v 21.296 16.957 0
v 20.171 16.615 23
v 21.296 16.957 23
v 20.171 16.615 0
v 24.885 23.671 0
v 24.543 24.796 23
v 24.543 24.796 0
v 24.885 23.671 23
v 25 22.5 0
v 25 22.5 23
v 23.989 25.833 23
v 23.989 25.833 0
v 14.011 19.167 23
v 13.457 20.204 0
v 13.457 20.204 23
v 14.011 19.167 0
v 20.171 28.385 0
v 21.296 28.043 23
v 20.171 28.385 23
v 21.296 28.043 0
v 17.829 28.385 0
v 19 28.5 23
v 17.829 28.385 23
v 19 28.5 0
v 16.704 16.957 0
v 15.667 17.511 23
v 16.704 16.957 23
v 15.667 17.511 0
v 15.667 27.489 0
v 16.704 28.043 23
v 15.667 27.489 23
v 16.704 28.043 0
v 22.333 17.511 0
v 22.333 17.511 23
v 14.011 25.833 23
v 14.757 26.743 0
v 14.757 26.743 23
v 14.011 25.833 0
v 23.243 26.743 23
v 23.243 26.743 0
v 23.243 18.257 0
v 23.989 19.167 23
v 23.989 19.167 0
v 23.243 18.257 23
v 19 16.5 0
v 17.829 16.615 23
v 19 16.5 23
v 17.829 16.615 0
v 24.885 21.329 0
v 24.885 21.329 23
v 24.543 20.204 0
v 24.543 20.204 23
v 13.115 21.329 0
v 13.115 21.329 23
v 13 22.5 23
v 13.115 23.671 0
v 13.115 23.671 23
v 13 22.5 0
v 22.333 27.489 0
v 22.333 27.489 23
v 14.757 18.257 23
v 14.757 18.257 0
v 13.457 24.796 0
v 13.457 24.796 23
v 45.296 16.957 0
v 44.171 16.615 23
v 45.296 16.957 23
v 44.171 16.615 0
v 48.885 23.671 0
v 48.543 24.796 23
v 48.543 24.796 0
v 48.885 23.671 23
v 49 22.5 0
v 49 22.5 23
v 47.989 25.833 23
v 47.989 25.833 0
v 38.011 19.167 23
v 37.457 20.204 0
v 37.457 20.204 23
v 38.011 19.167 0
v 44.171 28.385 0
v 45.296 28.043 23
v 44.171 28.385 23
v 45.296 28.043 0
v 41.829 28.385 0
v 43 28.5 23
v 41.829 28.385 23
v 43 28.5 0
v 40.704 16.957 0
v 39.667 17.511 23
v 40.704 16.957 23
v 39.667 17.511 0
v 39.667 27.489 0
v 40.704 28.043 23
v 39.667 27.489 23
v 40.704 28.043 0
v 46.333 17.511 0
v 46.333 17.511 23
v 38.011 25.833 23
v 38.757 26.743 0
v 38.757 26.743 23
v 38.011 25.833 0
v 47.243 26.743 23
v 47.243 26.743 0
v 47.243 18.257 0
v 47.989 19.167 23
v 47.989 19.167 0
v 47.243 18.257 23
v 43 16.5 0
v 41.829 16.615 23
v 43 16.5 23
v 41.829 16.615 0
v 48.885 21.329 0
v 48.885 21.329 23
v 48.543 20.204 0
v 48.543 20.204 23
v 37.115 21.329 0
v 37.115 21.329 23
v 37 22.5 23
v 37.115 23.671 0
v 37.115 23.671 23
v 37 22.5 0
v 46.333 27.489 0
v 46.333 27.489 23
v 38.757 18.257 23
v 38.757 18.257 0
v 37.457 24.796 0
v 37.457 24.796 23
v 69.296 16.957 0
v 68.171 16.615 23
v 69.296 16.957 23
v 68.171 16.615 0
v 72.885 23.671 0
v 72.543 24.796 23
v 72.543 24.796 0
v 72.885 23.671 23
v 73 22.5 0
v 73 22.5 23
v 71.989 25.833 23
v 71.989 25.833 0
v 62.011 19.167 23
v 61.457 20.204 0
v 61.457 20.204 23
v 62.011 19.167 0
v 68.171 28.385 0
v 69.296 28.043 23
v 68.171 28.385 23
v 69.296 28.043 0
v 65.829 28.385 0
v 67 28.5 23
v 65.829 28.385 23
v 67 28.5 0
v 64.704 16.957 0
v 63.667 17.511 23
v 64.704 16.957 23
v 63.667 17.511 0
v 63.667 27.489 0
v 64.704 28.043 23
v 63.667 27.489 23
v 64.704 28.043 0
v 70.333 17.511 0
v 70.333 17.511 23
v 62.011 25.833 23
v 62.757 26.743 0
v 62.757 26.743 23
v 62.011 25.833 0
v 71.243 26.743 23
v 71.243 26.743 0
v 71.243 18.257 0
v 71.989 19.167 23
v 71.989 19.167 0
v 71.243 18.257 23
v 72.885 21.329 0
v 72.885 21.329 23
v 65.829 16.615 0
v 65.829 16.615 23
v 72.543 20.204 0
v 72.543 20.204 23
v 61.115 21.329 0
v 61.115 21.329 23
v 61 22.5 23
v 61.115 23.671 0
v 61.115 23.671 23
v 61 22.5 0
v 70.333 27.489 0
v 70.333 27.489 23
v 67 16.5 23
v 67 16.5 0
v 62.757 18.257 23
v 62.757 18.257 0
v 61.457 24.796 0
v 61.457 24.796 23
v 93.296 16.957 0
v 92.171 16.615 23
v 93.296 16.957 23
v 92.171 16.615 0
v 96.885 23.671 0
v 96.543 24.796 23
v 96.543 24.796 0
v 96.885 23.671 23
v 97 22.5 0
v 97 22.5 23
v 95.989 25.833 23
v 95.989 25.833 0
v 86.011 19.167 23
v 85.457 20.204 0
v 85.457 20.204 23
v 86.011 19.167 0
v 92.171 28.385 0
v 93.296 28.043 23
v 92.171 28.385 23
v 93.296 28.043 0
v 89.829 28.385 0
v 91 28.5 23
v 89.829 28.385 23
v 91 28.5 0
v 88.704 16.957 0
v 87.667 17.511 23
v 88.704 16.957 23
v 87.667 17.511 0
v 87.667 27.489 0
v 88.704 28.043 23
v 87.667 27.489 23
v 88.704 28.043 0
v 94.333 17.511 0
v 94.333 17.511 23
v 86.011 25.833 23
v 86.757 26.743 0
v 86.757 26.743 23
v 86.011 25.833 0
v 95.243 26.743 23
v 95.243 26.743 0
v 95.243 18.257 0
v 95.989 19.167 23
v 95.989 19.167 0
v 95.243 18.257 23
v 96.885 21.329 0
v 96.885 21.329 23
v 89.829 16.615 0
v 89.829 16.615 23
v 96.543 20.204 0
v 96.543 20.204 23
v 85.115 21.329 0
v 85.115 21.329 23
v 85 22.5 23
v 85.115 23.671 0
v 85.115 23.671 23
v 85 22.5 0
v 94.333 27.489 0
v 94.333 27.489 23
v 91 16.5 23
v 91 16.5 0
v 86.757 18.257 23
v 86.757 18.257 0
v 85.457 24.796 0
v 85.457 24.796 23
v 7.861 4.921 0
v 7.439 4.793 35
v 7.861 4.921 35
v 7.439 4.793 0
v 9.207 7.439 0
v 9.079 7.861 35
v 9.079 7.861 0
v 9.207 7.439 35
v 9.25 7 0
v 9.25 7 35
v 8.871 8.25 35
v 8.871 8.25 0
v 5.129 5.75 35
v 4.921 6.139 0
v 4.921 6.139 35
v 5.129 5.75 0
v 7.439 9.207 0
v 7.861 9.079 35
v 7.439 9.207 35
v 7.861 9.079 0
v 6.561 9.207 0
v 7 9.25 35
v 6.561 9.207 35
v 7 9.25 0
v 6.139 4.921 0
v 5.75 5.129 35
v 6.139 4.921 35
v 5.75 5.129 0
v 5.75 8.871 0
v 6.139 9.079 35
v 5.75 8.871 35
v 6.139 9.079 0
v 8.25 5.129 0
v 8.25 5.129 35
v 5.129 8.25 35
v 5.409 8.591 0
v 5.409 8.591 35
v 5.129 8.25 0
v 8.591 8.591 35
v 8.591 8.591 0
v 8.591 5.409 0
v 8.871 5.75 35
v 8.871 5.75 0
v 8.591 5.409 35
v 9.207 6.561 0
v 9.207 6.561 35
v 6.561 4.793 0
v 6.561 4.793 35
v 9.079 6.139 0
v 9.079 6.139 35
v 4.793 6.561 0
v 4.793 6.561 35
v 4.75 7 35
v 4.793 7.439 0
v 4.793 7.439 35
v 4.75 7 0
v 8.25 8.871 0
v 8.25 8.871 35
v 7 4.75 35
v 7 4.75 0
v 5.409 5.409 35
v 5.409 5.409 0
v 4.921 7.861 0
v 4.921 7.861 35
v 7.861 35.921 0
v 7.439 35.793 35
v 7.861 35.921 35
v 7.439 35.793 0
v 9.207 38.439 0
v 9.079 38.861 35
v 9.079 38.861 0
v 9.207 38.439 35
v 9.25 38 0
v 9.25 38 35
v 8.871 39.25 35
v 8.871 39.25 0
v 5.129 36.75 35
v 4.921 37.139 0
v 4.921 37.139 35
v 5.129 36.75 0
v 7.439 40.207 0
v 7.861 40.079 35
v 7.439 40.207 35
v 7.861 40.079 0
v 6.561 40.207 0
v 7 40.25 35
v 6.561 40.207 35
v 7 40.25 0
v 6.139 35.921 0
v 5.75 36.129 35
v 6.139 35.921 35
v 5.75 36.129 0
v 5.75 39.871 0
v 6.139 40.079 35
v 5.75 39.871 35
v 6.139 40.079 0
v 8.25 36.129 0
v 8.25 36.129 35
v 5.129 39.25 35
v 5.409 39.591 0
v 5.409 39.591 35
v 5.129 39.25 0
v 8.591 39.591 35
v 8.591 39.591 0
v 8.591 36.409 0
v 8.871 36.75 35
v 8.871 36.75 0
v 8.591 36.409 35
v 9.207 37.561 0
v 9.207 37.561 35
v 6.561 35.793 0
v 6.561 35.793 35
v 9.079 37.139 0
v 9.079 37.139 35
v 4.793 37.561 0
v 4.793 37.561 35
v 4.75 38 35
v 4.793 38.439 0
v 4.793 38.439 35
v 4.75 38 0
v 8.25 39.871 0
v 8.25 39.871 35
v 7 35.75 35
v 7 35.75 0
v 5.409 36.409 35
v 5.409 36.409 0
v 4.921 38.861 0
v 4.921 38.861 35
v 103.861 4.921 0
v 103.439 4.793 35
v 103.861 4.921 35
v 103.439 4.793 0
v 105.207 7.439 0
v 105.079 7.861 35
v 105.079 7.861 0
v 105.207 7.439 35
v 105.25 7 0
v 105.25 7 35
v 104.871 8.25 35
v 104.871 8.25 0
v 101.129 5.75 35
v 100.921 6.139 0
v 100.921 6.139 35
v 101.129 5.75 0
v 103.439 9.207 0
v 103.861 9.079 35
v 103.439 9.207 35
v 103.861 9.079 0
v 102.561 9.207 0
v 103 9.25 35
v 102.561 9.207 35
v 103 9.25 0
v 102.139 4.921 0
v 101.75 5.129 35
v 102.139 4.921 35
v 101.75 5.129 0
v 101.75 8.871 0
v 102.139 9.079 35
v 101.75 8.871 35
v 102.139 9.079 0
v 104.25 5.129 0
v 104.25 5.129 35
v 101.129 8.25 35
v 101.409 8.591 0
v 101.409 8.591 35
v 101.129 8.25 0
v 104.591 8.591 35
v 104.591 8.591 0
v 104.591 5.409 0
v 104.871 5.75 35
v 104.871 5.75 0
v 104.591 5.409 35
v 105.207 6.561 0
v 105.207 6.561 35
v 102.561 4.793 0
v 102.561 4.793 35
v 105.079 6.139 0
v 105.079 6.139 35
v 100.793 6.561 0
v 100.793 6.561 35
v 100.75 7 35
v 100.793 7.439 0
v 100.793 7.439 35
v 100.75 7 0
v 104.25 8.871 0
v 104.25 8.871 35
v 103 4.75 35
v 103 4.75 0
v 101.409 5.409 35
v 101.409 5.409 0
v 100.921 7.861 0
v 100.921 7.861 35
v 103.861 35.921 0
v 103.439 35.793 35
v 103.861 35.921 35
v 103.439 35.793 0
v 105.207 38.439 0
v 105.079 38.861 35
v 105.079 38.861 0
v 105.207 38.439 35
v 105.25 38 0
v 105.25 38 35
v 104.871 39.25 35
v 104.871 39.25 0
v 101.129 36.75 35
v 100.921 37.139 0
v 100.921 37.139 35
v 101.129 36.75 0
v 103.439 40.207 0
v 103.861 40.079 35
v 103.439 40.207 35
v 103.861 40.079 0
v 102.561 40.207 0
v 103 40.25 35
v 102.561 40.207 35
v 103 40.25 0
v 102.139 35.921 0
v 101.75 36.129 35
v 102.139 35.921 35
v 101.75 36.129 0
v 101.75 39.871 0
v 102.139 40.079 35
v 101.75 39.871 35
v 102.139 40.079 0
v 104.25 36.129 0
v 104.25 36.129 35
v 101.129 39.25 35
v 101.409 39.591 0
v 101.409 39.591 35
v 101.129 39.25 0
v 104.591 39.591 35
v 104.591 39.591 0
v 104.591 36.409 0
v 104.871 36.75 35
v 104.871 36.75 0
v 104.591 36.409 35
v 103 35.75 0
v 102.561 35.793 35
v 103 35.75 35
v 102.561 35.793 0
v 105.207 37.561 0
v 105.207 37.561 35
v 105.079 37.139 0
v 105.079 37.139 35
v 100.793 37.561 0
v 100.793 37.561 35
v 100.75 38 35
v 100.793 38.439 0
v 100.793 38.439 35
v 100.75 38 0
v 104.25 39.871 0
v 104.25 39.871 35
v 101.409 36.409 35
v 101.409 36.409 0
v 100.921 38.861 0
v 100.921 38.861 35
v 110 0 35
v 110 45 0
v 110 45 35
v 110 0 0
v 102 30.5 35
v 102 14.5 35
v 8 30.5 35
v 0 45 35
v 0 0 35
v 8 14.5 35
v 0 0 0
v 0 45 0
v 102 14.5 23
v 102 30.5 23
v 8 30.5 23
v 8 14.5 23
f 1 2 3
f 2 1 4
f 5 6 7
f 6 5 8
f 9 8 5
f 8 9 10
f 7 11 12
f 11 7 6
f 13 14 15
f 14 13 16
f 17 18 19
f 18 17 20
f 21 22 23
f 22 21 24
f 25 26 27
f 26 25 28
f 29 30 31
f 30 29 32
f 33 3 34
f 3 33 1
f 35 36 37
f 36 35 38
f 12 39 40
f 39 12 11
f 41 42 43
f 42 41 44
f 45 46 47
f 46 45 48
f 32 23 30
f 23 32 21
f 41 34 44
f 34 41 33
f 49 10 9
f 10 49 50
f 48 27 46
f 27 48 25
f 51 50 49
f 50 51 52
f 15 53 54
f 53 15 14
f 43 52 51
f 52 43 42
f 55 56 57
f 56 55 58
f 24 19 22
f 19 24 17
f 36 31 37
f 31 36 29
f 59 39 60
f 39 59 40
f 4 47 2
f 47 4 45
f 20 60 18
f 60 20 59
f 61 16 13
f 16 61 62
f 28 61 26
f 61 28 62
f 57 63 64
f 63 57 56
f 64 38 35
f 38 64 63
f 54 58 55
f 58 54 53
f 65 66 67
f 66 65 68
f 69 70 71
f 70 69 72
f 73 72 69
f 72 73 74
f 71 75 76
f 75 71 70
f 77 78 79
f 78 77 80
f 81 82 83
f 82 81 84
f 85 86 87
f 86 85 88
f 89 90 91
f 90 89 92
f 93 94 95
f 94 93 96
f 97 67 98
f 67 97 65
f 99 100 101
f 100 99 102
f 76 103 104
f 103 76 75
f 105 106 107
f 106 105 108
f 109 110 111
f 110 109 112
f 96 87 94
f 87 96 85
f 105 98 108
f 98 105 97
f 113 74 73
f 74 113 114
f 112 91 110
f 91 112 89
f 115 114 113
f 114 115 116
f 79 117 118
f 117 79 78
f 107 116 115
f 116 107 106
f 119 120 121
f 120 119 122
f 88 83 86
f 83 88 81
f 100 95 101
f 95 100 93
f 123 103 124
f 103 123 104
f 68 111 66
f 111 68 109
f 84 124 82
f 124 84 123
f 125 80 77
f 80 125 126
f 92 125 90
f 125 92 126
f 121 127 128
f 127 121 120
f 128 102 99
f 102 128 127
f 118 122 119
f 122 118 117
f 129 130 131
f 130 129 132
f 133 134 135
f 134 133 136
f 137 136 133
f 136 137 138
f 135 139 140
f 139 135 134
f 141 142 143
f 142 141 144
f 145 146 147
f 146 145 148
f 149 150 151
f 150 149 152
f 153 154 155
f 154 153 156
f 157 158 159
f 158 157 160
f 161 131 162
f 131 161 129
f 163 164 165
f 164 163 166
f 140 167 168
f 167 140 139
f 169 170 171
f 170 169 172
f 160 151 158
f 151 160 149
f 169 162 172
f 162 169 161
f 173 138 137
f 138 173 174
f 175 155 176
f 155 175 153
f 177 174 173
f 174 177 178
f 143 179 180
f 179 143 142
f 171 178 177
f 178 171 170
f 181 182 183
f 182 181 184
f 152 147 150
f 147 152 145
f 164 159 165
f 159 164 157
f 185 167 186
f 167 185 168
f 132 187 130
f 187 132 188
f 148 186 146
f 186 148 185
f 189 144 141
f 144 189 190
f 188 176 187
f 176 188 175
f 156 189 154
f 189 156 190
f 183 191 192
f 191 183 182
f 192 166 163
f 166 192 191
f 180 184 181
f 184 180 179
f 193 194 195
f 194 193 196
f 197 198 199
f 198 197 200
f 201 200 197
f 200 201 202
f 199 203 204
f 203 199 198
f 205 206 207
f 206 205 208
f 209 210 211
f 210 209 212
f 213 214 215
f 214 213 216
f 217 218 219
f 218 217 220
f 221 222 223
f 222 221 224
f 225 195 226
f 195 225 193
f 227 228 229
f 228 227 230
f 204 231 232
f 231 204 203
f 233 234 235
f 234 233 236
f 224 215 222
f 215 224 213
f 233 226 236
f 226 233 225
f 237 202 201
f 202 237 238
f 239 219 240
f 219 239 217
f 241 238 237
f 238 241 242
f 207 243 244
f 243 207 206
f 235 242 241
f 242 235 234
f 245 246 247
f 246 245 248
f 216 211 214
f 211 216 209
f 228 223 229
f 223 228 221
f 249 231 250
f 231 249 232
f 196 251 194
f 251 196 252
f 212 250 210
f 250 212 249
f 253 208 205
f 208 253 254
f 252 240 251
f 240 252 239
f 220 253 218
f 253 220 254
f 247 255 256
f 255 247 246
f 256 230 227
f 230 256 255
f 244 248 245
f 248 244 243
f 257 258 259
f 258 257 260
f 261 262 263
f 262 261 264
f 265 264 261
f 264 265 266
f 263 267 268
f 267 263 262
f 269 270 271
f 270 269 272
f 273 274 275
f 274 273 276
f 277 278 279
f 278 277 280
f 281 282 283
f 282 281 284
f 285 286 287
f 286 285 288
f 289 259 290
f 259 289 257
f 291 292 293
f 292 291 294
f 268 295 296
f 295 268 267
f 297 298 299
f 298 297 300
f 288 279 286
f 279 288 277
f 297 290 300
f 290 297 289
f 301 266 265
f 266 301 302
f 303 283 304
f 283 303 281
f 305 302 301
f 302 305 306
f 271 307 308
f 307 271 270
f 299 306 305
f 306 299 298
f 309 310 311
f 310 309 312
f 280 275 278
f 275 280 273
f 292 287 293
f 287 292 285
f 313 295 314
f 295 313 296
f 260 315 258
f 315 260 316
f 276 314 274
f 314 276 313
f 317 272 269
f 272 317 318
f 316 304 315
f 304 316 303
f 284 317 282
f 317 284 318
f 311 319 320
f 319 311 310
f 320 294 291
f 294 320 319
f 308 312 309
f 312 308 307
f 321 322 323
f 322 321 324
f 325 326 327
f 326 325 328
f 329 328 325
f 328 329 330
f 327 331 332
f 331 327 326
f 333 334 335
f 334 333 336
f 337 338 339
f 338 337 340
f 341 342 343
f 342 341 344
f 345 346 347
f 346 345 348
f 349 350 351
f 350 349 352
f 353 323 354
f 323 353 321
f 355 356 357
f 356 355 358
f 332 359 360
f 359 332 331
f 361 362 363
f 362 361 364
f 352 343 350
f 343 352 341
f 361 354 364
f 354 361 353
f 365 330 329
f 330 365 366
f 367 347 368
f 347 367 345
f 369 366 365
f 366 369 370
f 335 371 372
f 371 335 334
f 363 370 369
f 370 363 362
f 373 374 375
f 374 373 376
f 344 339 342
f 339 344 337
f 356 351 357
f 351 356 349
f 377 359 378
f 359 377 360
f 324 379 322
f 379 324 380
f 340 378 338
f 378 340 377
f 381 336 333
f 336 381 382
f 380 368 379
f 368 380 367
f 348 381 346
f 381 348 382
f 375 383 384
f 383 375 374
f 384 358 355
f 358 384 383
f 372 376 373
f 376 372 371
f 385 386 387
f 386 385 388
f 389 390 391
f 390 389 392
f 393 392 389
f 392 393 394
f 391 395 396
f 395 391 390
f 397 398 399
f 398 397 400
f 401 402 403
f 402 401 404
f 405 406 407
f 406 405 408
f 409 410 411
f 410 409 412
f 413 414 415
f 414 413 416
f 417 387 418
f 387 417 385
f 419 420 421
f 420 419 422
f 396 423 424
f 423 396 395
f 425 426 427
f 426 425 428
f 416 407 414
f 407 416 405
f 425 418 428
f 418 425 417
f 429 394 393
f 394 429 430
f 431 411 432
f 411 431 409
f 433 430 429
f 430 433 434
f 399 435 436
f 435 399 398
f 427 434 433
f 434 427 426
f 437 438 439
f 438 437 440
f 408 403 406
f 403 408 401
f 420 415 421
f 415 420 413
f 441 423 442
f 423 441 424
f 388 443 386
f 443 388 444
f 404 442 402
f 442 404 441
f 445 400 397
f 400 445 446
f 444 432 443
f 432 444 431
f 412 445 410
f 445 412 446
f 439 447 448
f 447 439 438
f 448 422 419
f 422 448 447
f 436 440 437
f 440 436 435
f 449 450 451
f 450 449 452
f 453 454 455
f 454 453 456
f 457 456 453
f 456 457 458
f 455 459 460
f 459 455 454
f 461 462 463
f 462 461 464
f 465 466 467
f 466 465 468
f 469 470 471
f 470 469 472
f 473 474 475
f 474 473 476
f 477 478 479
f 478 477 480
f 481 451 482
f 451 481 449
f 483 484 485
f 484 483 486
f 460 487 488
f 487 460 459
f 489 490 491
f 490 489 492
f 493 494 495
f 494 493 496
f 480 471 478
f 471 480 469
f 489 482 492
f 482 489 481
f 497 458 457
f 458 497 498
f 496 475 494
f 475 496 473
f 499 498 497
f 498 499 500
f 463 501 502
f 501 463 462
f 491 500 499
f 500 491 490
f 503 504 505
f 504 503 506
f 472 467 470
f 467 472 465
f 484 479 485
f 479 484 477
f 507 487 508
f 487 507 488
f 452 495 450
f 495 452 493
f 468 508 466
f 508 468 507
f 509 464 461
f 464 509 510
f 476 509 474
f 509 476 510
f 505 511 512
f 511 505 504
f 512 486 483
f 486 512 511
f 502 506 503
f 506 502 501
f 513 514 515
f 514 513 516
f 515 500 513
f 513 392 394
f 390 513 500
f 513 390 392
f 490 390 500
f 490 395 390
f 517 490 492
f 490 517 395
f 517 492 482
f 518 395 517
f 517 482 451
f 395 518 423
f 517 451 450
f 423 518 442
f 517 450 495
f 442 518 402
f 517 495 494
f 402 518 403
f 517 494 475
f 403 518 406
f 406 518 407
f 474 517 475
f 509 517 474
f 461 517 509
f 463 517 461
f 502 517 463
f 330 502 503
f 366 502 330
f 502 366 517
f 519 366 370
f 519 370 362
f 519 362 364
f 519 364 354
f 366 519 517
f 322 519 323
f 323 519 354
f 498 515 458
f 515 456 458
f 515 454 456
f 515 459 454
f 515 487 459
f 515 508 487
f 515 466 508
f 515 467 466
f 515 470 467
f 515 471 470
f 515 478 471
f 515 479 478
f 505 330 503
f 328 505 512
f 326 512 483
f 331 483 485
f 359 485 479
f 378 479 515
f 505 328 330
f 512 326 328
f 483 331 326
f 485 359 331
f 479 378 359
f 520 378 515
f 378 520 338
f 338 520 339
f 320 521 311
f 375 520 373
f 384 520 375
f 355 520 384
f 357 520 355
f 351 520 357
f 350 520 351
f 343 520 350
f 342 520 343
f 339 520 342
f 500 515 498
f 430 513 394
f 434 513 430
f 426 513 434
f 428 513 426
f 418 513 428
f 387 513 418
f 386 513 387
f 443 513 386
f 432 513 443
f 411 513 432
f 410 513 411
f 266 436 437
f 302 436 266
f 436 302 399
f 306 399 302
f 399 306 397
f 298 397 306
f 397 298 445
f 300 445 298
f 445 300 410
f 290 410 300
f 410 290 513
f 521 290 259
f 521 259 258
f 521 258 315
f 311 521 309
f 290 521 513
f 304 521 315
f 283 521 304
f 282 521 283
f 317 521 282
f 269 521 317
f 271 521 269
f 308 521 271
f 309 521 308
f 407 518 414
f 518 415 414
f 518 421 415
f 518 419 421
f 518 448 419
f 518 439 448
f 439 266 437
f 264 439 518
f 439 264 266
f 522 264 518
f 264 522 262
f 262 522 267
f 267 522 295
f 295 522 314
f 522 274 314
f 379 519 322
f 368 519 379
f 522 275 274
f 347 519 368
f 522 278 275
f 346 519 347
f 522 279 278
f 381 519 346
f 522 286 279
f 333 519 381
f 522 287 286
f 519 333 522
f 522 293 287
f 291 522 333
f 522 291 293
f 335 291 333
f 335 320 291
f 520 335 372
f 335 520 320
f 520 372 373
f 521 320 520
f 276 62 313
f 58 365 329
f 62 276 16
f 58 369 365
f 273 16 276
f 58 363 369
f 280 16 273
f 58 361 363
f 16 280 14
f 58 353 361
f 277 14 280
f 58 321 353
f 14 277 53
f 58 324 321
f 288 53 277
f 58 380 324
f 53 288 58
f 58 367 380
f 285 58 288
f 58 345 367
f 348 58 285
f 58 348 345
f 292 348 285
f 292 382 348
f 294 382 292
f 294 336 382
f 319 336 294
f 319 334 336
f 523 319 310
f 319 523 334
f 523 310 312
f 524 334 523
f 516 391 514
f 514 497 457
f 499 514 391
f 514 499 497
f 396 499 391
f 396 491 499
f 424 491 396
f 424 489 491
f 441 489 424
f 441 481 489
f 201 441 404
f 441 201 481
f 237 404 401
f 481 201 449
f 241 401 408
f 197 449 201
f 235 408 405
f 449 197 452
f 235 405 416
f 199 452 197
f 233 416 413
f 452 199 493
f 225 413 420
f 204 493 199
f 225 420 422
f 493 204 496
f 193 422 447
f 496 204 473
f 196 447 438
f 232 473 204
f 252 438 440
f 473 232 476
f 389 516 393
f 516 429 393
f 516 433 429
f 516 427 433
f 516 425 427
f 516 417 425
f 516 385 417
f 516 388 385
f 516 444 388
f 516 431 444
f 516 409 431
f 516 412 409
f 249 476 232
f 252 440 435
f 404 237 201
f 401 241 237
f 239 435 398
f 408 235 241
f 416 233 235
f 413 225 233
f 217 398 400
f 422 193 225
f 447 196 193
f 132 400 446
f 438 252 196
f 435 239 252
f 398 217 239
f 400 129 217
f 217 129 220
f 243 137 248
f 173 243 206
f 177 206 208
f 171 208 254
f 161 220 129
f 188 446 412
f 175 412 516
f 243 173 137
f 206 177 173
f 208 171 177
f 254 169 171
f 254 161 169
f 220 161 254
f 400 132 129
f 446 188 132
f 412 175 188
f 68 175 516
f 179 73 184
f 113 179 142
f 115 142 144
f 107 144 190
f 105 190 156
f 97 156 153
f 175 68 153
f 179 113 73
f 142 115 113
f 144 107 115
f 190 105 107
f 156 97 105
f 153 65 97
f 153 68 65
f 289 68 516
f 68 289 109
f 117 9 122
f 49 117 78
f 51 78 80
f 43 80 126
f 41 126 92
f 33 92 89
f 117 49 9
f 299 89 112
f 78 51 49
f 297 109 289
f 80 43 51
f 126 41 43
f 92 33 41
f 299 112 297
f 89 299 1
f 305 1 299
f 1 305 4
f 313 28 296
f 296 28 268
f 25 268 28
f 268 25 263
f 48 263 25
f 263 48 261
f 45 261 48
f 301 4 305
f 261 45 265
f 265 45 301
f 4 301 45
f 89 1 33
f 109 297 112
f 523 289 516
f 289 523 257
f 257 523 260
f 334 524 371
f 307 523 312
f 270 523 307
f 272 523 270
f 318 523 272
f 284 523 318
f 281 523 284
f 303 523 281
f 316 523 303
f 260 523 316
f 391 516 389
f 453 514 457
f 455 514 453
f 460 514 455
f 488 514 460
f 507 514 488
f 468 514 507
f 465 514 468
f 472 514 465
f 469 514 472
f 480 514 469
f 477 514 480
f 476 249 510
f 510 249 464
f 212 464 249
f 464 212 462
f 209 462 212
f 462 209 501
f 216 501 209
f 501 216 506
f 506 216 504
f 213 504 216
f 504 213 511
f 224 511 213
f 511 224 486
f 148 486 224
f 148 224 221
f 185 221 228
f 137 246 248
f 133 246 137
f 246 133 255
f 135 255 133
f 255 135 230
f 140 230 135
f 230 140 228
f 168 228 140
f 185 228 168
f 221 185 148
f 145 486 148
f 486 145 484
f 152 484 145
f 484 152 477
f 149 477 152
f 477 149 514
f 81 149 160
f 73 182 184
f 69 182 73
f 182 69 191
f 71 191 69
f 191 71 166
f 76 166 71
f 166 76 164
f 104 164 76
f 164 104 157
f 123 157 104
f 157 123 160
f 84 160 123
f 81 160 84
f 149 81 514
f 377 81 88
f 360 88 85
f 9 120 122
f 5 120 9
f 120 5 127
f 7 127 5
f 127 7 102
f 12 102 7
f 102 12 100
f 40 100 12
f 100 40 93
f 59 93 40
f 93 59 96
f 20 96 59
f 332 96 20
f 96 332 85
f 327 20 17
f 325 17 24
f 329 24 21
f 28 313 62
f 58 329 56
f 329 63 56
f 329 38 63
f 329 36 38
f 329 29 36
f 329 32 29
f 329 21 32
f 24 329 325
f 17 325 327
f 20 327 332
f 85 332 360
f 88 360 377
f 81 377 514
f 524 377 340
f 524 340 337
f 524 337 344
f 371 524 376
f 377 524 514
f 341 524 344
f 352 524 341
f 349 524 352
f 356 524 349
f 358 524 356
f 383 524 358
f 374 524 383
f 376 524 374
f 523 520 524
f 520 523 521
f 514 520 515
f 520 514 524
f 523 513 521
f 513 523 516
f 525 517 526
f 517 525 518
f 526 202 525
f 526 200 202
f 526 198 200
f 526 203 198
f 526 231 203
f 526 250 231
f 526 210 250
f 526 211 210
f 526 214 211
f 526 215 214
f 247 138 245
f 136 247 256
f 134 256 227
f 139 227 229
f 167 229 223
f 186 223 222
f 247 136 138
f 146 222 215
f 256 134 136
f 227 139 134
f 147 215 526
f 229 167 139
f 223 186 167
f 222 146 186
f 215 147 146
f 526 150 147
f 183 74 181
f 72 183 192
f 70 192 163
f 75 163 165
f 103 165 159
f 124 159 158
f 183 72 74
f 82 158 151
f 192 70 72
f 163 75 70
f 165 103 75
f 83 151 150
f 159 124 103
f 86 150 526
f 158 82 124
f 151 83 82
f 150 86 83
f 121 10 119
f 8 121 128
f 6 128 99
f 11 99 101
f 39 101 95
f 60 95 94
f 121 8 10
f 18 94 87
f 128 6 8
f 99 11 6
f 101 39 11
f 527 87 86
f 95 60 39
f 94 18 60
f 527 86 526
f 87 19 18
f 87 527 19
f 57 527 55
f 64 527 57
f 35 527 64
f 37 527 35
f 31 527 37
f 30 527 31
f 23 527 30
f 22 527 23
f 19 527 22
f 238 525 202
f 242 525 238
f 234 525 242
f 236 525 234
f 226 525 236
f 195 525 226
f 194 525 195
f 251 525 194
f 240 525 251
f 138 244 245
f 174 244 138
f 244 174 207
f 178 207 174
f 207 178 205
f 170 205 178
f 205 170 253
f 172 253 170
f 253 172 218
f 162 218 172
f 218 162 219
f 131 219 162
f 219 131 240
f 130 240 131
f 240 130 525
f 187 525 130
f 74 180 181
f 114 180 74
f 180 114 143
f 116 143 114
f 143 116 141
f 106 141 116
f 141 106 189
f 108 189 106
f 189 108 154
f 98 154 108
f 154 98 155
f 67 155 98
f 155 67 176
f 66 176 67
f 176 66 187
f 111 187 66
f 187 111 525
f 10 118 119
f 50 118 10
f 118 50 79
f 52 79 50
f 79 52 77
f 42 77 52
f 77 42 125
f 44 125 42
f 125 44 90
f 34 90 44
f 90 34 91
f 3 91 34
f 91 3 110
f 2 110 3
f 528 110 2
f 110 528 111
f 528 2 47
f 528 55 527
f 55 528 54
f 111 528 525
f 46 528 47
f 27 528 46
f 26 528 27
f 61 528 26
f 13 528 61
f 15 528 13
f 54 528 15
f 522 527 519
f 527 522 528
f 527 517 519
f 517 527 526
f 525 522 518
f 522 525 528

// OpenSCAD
$fn = 32;

// ----------------------------------------------------------------------
// Manifold block: gallery_top manifold
// ----------------------------------------------------------------------

// --- parameters (mm) ---
block_l = 110;            // block length, X
block_w = 45;             // block width, Y
block_h = 35;             // block height, Z
port_d = 12;              // port bore diameter
port_pitch = 24;          // port pitch along X
gallery_d = 16;           // top gallery width, Y
gallery_depth = 12;       // gallery pocket depth
wall_p = 8;               // gallery end wall thickness, X
mnt_d = 4.5;              // mounting hole diameter
mnt_in = 7;               // mounting hole inset from the edges

n_ports = 4;  // ports in the row
port_x0 = (block_l - (n_ports - 1) * port_pitch) / 2;  // first port X

difference() {
  cube([block_l, block_w, block_h]);
  for (i = [0 : n_ports - 1])
    translate([port_x0 + i * port_pitch, block_w / 2, -1])
      cylinder(h = block_h + 2, d = port_d);
  translate([wall_p, block_w / 2 - gallery_d / 2, block_h - gallery_depth])
    cube([block_l - 2 * wall_p, gallery_d, gallery_depth + 1]);
  for (cx = [mnt_in, block_l - mnt_in])
    for (cy = [mnt_in, block_w - mnt_in])
      translate([cx, cy, -1]) cylinder(h = block_h + 2, d = mnt_d);
}
